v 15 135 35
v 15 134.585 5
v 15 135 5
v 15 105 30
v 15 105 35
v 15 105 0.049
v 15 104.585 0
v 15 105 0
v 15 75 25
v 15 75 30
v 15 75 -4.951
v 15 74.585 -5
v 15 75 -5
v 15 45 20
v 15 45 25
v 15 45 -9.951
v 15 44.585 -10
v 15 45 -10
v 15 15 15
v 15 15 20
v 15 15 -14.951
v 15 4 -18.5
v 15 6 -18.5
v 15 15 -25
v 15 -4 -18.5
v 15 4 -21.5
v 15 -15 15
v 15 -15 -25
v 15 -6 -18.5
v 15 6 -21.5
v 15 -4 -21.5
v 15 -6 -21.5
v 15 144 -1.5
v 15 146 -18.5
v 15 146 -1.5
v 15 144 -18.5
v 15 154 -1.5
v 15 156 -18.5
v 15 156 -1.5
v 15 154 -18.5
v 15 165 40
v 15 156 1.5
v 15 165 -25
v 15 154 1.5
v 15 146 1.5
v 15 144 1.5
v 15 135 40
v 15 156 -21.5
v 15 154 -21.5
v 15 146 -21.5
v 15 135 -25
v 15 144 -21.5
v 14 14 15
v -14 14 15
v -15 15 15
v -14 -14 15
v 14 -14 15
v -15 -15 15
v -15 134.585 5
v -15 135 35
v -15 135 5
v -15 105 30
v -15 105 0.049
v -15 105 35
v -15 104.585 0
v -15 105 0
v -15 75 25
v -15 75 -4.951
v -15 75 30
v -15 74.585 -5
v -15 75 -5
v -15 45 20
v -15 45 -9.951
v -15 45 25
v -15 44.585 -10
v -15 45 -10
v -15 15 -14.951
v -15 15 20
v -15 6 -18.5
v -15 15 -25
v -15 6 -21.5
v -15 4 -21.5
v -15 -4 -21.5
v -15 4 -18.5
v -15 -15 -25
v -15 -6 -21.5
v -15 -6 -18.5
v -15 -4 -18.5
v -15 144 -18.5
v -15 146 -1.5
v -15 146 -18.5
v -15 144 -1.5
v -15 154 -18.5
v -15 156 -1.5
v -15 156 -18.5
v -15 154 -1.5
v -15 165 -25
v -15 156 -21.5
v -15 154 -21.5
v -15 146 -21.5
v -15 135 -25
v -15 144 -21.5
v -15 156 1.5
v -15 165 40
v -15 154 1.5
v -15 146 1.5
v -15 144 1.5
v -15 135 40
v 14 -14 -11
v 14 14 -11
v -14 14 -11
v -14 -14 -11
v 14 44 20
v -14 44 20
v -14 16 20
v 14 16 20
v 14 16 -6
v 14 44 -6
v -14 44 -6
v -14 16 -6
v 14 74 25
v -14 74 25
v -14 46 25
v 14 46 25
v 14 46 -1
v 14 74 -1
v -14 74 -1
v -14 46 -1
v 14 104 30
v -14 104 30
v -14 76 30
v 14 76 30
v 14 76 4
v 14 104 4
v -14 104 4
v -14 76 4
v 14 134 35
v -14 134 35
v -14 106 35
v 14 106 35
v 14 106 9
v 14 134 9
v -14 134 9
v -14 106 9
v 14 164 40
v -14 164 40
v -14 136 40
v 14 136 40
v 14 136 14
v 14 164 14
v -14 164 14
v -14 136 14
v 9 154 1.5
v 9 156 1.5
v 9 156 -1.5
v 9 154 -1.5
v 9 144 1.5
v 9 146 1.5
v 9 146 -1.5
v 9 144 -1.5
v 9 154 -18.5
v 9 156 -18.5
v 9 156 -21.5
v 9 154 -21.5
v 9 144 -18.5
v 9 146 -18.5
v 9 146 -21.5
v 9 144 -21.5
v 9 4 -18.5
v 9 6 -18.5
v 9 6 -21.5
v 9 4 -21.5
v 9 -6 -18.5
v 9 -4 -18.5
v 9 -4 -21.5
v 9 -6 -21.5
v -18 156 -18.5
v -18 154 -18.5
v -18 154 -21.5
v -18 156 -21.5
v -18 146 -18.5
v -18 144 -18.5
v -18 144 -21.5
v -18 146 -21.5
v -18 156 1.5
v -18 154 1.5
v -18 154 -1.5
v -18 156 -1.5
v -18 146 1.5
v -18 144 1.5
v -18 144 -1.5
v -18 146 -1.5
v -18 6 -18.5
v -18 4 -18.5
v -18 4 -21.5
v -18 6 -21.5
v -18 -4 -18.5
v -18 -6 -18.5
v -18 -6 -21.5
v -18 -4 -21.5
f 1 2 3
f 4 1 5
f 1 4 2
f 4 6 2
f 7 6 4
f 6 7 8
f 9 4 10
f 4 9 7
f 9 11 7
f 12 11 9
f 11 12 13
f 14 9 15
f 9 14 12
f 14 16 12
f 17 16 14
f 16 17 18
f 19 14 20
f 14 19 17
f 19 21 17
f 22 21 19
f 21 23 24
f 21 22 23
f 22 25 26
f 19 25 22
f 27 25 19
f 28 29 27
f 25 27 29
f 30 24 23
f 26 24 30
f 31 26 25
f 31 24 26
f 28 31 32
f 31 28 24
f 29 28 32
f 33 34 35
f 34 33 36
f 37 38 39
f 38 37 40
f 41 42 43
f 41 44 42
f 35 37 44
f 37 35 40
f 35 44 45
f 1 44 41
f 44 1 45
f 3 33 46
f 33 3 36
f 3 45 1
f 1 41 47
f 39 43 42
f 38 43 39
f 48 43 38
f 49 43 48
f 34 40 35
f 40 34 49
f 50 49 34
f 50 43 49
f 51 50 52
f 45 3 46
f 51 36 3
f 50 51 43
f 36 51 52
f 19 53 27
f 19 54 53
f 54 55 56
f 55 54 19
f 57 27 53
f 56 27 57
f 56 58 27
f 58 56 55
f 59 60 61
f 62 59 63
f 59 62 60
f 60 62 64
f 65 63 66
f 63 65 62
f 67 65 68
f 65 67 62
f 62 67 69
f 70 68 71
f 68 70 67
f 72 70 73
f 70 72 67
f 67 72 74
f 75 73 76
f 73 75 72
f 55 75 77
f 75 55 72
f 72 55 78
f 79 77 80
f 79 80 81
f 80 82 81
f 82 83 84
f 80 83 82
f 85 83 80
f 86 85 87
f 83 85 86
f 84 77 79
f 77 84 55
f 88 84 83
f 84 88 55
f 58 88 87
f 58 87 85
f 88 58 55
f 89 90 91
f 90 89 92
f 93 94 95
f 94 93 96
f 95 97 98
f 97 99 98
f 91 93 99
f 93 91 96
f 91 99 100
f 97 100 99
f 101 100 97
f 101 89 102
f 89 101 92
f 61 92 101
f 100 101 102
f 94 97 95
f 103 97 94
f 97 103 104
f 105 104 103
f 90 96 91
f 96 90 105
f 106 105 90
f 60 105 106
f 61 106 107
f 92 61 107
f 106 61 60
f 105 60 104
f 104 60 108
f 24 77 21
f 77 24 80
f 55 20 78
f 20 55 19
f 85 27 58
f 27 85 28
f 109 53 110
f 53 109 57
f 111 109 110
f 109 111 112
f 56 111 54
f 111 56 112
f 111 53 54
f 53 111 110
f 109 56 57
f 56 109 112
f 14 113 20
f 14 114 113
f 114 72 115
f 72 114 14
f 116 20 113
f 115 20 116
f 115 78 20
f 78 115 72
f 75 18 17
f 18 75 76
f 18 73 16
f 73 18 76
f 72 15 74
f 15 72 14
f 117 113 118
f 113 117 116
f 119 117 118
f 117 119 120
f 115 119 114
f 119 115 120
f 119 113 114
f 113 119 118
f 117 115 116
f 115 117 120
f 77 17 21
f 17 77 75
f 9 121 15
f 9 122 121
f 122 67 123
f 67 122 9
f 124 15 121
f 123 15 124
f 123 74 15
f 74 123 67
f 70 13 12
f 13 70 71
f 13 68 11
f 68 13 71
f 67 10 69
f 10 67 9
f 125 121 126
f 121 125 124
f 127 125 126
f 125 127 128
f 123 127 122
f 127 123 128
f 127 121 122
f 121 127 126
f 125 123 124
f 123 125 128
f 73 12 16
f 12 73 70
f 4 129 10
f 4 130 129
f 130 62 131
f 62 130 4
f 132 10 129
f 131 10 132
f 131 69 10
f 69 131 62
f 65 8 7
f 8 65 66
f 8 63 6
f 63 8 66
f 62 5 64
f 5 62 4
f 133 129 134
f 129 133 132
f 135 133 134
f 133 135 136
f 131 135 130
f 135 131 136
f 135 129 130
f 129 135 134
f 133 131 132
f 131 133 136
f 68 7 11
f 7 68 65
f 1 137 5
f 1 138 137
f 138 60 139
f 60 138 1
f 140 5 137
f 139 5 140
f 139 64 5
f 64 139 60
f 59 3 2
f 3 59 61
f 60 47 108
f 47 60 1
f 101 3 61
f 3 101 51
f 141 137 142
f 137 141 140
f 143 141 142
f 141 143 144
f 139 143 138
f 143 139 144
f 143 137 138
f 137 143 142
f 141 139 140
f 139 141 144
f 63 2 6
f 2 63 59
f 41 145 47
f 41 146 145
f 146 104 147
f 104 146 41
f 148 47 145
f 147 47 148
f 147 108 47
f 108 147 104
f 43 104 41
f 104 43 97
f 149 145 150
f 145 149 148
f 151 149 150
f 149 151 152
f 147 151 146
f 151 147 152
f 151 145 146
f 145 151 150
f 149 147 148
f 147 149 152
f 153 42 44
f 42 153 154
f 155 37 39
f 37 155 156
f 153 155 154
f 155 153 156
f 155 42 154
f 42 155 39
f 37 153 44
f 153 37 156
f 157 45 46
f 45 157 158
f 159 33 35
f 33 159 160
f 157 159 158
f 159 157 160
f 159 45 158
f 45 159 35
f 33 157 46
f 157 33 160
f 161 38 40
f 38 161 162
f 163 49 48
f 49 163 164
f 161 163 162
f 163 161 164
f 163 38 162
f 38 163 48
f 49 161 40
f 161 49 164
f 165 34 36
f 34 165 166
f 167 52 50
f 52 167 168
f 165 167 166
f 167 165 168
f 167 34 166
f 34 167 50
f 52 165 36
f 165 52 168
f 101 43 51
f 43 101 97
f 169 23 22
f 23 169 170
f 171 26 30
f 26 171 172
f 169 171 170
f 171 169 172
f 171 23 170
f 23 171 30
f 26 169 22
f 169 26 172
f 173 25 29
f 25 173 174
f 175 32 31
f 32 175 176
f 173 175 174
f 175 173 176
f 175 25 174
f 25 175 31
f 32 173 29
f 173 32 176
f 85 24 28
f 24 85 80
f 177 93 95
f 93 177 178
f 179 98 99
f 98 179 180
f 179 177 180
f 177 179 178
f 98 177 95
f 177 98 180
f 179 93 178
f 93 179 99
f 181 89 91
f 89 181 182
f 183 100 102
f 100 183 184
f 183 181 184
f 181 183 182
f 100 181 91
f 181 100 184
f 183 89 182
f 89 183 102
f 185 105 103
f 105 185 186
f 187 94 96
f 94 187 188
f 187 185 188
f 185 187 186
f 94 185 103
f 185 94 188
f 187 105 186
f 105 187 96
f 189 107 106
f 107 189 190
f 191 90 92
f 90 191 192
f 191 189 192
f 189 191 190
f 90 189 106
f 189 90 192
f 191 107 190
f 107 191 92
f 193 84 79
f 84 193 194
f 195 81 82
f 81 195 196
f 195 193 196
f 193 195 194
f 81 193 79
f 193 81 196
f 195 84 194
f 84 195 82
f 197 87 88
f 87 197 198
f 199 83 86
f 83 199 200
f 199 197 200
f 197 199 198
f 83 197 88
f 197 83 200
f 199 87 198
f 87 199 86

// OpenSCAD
module connector2(x=0, y=0, z=0) {
    translate([x-6, y, z]) cube([4, 2, 3], center=true);
}

module connector_hole(x=0, y=0, z=0) {
        translate([x, y, z]) color("blue") cube([8, 2, 3], center=true);    
}

module wedge(width, depth, height, angle) {
    difference() {
        translate([0, 0, 0]) cube([width, depth, height], center=true);
        translate([width/2, 0, 0]) rotate(angle, [0, 1, 0]) cube([width*4, depth*2, height], center=true);
    }
}

module polish_pod(x=0, y=0, z=0, add_wedge=true) {
    difference() {
        translate([x, y, z]) cube([30, 30, 30], center=true);
        translate([x, y, z+5]) cube([28, 28, 32], center=true);
    }

    if (add_wedge) {
        translate([x, y, z-20]) rotate(90, [0, 0, 1]) wedge(30, 30, 10, -9.5);
    }
}

for (y = [0:5]) {
    polish_pod(x=0, y=y*30, z=y*5, add_wedge=(y != 0 && y != 5));
}

add_connectors = true;
add_holes = true;

// back foot
difference() {
    translate([-15, 30*5-15, -25]) cube([30, 30, 35]);

    if (add_holes) {
        // connector holes
        translate([13, 30*5+5, 0]) connector_hole();
        translate([13, 30*5-5, 0]) connector_hole();
        translate([13, 30*5+5, -20]) connector_hole();
        translate([13, 30*5-5, -20]) connector_hole();
    }
}

// front foot
difference() {
    translate([-15, -15, -25]) cube([30, 30, 10]);

    if (add_holes) {
        // connector holes
        translate([13, 5, -20]) connector_hole();
        translate([13, -5, -20]) connector_hole();
    }
}

if (add_connectors) {
    translate([-10, 30*5+5, -20]) connector2();
    translate([-10, 30*5-5, -20]) connector2();

    translate([-10, 30*5+5, 0]) connector2();
    translate([-10, 30*5-5, 0]) connector2();

    translate([-10, 5, -20]) connector2();
    translate([-10, -5, -20]) connector2();
}
